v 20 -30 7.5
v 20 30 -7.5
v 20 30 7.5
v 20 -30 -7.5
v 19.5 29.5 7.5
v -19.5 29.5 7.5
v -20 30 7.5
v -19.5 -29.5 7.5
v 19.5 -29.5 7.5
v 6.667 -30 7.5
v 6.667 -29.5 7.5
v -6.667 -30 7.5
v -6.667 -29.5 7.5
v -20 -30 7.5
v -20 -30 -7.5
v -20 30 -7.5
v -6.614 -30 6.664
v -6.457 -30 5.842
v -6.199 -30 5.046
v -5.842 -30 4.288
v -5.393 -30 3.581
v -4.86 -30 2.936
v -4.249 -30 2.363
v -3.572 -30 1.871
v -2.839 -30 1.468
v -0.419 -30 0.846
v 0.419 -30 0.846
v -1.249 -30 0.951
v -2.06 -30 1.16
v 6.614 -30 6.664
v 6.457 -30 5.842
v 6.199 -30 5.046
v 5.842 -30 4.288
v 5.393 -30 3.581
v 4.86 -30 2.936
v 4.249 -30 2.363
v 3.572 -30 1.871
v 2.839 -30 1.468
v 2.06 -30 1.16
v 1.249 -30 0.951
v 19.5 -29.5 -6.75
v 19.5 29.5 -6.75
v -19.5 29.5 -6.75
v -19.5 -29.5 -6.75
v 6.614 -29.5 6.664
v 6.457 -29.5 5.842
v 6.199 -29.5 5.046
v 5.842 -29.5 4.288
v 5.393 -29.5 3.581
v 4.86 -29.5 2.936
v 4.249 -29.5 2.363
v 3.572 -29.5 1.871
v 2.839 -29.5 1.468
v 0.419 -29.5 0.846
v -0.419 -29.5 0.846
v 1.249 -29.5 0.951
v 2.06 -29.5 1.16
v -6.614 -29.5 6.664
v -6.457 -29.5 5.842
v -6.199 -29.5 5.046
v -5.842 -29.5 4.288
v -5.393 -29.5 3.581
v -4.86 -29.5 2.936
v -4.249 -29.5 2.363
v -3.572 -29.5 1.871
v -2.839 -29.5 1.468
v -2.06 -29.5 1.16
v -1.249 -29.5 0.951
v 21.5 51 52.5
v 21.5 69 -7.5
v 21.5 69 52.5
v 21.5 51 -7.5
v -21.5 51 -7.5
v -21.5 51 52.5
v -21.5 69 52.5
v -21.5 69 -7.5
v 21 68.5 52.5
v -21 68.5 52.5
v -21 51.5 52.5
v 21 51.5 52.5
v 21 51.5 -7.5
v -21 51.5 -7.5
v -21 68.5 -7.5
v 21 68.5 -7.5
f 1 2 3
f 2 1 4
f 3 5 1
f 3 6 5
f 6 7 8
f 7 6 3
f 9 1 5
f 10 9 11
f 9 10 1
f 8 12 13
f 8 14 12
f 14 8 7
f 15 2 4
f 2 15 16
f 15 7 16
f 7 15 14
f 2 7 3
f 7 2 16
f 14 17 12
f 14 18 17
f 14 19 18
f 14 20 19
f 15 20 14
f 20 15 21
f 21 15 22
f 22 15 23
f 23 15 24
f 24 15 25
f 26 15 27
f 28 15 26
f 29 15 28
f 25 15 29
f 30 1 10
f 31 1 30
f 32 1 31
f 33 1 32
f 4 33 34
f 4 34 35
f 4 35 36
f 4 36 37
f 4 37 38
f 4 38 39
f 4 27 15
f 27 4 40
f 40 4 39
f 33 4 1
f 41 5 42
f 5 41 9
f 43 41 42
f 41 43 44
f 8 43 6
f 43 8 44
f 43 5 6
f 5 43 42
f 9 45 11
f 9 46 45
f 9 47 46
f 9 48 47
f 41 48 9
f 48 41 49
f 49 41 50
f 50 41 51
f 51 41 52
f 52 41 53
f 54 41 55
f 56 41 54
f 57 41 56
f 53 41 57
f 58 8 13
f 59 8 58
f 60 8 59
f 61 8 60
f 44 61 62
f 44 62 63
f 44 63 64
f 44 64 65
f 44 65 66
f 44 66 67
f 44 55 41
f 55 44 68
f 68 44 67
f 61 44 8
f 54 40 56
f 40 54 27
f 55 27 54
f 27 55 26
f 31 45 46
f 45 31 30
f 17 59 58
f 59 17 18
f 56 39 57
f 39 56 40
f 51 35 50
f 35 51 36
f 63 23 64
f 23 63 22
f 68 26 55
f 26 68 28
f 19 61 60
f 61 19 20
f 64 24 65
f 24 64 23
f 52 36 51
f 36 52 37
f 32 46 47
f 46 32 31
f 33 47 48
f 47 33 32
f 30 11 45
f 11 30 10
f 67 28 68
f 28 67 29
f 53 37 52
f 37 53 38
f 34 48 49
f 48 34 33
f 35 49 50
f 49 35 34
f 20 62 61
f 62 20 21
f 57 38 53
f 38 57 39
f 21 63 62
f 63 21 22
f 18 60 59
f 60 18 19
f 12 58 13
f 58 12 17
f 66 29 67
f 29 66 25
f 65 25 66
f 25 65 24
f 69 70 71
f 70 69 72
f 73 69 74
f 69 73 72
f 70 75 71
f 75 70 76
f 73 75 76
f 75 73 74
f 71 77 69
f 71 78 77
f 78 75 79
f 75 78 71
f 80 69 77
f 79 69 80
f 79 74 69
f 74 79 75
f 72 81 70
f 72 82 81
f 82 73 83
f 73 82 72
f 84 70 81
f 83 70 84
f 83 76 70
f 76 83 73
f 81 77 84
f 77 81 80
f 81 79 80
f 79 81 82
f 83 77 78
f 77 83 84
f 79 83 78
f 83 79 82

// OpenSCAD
//Parametric Matchbox Maker
//by Hermes Alvarado
//<hermesalvarado@gmail.com>
//www.facebook.com/MyDigitalDreamland

//Parameters:
width = 40;
length = 60;
height = 15;
thickness = 1;
bottomthickness = .5;
tolerance = 1;
resolution = 50; //20: low, 50: mid, 75: high;
useText = false; //true or false;
useDXF = false; //true or false;
customtext = "hello"; //use quotation marks;
customtextsize = 10;
customDXF = "smile.dxf"; //smile.dxf, clip.dxf, domo.dxf, heart.dxf

//Gererators:
module boxhole(){
    translate([0,0,height/2]){
        rotate([90,0,0]){
            cylinder($fn=resolution,h=length/2,r=width/6,center=false);
        }
    }
}
module matchbox(){
    difference(){
        cube([width,length,height],true);
        translate([0,0,bottomthickness]){
            cube([width-thickness, length-thickness,height-bottomthickness], true);
        }
        boxhole();
    }
}
module customtext(){
    translate([0,0,height/2+tolerance+thickness/4]){
        linear_extrude(thickness/2,center=false,convexity=10){
            $fn=resolution;
            text(customtext,customtextsize,font="Liberation:style=Bold",halign="center",valign="center");
        }
    }
}
module customDXF(){
    translate([0,0,height/2+tolerance+thickness/4]){
        linear_extrude(thickness/2,center=false,convexity=10){
            $fn=resolution;
            import(file=customDXF);
        }
    }
}
module sleeve(){
    translate([0,length,length/2-height/2]){
        rotate([90,0,0]){
            difference(){
                cube([width+thickness+tolerance*2,length,height+thickness+tolerance*2],true);
                cube([width+tolerance*2,length+thickness+tolerance,height+tolerance*2],true);
                if(useDXF==true){
                    customDXF();
                }
                if(useText==true){
                   customtext();
                } 
            }
        }
    }
}
matchbox();
sleeve();
